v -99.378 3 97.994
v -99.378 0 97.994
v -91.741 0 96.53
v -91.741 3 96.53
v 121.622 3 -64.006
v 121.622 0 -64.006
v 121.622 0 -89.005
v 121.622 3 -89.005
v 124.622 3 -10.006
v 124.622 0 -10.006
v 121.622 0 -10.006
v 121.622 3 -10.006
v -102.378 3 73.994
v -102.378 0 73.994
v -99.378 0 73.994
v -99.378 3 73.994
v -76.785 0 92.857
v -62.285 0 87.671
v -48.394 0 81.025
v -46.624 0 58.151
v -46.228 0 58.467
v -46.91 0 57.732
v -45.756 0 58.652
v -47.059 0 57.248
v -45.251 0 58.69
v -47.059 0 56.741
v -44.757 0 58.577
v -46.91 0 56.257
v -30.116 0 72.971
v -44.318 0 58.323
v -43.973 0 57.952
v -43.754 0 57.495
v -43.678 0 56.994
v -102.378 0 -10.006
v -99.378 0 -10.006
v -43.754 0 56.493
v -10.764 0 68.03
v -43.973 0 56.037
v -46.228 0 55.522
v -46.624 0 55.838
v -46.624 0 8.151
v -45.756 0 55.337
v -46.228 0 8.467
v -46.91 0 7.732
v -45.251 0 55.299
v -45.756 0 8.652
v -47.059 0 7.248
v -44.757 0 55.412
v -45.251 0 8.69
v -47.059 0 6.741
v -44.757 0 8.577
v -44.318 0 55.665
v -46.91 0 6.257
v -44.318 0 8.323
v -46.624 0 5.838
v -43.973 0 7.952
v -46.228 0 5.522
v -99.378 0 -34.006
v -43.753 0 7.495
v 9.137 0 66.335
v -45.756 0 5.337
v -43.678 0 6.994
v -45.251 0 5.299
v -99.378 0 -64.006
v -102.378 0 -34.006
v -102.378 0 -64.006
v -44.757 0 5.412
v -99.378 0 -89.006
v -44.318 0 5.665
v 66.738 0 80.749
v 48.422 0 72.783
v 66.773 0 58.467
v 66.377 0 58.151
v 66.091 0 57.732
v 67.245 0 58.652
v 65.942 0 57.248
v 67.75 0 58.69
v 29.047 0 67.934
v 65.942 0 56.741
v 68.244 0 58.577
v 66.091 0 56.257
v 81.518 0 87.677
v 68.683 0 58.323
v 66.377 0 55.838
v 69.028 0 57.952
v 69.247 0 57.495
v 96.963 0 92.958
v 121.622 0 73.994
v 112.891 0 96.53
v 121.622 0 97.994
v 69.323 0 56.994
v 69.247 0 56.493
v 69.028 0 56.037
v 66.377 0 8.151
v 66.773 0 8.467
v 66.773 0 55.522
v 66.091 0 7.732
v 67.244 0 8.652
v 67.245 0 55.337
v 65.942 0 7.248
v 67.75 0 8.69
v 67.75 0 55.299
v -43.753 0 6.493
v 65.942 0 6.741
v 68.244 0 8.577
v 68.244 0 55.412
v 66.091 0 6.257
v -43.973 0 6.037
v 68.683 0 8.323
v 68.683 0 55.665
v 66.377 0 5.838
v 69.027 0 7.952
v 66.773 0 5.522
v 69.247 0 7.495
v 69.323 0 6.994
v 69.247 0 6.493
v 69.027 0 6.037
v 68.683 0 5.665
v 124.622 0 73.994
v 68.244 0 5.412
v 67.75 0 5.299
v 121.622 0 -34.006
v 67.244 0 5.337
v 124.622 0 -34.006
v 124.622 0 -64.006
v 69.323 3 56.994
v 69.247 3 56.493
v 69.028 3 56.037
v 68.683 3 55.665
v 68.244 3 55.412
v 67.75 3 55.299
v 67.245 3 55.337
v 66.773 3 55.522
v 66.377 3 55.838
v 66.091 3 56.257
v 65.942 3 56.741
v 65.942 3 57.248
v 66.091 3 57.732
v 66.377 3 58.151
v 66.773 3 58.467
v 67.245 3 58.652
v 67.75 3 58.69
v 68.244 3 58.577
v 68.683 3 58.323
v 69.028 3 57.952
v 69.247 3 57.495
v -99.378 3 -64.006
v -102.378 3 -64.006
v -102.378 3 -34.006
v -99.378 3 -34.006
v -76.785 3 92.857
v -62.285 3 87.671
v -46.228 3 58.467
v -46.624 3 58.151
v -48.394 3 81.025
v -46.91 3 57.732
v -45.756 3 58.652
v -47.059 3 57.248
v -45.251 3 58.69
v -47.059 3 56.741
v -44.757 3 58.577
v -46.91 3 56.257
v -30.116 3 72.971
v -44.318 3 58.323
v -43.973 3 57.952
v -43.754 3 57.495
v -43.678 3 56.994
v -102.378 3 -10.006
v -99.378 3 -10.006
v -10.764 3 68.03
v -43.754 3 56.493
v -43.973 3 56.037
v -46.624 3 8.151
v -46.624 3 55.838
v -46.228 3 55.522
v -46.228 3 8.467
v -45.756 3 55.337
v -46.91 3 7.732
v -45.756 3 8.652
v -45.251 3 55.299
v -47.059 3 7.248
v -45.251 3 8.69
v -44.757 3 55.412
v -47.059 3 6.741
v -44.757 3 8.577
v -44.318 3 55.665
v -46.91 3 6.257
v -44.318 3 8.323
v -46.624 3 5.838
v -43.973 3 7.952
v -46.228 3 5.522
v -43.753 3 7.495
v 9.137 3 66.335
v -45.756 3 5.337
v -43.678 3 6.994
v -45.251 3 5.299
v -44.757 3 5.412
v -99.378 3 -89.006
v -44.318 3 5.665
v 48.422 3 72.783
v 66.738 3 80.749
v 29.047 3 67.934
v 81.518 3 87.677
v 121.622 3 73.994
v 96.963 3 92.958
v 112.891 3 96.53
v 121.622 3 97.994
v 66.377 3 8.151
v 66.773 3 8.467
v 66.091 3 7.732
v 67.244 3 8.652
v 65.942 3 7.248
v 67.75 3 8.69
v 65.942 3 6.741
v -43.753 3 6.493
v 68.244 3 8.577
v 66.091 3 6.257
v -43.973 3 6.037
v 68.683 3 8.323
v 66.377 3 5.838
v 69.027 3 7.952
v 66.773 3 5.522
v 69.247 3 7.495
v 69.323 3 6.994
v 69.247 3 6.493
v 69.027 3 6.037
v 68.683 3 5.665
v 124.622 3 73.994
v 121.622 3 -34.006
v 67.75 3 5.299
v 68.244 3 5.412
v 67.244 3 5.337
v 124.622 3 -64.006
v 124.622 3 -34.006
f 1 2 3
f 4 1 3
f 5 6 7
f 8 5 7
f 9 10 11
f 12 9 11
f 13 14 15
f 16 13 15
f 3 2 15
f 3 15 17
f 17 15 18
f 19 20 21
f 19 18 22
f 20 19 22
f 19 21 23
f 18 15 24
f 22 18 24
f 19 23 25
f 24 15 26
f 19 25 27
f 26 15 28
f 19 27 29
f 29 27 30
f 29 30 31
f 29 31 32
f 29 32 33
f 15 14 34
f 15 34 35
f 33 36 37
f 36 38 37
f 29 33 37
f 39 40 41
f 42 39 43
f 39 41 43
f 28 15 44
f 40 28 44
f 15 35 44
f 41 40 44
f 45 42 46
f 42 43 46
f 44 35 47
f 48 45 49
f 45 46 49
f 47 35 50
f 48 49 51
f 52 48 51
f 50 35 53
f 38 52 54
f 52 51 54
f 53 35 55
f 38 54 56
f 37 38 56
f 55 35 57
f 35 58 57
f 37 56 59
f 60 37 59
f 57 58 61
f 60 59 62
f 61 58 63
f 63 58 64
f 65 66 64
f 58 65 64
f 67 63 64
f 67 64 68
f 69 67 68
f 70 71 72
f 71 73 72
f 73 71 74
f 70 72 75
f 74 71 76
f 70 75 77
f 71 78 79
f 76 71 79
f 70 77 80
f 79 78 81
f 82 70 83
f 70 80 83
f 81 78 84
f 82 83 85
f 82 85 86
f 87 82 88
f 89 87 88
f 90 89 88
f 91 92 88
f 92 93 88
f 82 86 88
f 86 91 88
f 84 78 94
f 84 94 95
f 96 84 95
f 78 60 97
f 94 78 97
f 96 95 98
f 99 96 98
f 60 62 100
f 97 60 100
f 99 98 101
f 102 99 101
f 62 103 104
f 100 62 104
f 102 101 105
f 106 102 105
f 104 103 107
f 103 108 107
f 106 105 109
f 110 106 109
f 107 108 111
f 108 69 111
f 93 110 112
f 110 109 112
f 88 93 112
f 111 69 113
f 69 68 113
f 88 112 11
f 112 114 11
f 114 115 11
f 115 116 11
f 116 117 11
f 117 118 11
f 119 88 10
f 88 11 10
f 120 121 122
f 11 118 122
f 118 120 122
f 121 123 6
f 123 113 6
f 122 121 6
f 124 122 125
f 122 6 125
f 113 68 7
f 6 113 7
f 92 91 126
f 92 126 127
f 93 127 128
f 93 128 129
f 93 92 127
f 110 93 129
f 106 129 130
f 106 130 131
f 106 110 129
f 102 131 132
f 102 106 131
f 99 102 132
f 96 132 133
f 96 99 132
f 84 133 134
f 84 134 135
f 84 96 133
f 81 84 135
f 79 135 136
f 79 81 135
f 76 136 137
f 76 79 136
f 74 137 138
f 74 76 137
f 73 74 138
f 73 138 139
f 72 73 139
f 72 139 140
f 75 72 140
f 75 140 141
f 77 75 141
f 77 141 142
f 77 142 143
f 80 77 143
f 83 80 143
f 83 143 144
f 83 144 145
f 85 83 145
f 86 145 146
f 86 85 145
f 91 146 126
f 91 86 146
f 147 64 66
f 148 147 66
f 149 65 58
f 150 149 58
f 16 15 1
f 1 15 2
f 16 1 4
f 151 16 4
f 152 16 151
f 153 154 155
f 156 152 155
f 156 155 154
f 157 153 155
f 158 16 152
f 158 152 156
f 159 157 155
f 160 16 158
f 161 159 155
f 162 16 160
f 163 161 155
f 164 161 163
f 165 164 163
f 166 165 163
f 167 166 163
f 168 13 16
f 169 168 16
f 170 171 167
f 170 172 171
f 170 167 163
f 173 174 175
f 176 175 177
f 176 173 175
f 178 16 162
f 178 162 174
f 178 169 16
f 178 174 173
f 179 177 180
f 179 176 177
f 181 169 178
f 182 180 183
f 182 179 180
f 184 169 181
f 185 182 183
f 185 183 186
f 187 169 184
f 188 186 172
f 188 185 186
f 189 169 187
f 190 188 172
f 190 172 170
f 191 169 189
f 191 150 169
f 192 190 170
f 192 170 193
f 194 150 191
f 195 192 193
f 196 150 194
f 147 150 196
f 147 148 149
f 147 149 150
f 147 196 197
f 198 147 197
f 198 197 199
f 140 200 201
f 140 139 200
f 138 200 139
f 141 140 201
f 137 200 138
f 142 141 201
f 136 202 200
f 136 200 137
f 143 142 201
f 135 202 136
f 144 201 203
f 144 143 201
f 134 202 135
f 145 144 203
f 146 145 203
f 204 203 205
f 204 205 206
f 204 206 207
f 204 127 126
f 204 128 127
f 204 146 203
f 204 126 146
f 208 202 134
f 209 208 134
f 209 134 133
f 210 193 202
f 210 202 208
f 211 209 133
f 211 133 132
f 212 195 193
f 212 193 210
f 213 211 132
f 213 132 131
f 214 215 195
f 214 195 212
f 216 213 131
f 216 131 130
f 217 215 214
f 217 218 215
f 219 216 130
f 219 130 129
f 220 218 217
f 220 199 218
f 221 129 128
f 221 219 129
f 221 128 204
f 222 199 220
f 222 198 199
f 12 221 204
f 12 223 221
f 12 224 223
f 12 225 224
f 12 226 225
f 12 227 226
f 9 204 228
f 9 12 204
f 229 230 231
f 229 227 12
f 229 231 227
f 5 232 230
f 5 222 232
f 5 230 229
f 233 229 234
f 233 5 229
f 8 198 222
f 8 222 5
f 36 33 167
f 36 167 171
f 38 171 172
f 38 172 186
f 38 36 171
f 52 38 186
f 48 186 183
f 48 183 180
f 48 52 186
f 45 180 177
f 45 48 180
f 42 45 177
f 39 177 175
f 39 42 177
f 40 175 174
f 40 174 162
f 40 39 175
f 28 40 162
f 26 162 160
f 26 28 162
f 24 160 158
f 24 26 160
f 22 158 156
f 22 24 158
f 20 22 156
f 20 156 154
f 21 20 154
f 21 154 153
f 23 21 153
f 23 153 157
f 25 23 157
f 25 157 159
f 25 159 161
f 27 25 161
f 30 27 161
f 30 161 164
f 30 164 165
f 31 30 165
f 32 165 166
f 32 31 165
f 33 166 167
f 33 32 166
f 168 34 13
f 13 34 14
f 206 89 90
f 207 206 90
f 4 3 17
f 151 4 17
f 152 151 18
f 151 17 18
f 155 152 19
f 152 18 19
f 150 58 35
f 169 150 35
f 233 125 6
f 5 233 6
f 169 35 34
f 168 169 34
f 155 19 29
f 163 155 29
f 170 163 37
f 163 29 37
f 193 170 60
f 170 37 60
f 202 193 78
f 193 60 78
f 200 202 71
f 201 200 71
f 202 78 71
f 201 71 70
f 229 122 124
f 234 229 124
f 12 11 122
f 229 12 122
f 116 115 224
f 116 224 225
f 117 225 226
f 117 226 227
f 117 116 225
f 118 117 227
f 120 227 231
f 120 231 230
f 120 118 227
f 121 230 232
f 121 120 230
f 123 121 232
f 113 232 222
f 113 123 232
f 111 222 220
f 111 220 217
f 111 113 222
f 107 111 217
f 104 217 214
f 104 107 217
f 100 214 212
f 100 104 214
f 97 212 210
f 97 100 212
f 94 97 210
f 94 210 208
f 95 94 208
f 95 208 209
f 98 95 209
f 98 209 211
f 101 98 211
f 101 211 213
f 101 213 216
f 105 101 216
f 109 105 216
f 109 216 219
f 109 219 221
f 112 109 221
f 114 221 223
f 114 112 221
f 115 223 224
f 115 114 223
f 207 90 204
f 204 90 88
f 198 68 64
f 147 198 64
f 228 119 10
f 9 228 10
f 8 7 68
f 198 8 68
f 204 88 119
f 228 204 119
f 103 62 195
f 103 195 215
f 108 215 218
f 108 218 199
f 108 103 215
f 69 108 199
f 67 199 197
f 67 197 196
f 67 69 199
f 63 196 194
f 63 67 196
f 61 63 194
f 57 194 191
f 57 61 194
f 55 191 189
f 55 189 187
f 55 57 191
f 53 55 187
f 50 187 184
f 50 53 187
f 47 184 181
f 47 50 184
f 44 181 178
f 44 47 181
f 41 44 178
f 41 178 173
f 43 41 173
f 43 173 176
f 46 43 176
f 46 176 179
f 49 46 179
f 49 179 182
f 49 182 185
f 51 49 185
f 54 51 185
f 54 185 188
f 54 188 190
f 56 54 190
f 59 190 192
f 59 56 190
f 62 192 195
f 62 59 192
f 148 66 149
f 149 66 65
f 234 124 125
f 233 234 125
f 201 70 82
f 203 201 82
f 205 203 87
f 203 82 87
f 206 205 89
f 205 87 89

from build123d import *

# Parameters (mm, degrees)
CROQUIS1_R              = 1.7
SALIENTE_EXTRUIR1_DEPTH = 3


with BuildPart() as part:
    # Croquis1 → Saliente-Extruir1 (new body)
    with BuildSketch(Plane(origin=(0, 0, 0), x_dir=(1, 0, 0), z_dir=(0, 1, 0))):
        with BuildLine():
            Line((-99.377556398, 10.005876847), (-102.377556398, 10.005876847))
            Line((-102.377556398, 10.005876847), (-102.377556398, -73.994123153))
            Line((-102.377556398, -73.994123153), (-99.377556398, -73.994123153))
            Line((-99.377556398, -73.994123153), (-99.377556398, -97.994123153))
            Line((-99.377556398, -97.994123153), (-91.7405656, -96.529736825))
            ThreePointArc((-91.7405656, -96.529736825), (-69.468775837, -90.450126114), (-48.393725101, -81.024813273))
            ThreePointArc((-48.393725101, -81.024813273), (9.137426833, -66.335488141), (66.738359446, -80.748755569))
            ThreePointArc((66.738359446, -80.748755569), (89.168735578, -90.527731735), (112.890583803, -96.529736825))
            Line((112.890583803, -96.529736825), (121.622443602, -97.994123153))
            Line((121.622443602, -97.994123153), (121.622443602, -73.994123153))
            Line((121.622443602, -73.994123153), (124.622443602, -73.994123153))
            Line((124.622443602, -73.994123153), (124.622443602, 10.005876847))
            Line((124.622443602, 10.005876847), (121.622443602, 10.005876847))
            Line((121.622443602, 10.005876847), (121.622443602, 34.005876847))
            Line((121.622443602, 34.005876847), (124.622443602, 34.005876847))
            Line((124.622443602, 34.005876847), (124.622443602, 64.005876847))
            Line((124.622443602, 64.005876847), (121.622443602, 64.005876847))
            Line((121.622443602, 64.005876847), (121.622443602, 89.005112069))
            Line((121.622443602, 89.005112069), (-99.377556398, 89.005839795))
            Line((-99.377556398, 89.005839795), (-99.377556398, 64.005876847))
            Line((-99.377556398, 64.005876847), (-102.377556398, 64.005876847))
            Line((-102.377556398, 64.005876847), (-102.377556398, 34.005876847))
            Line((-102.377556398, 34.005876847), (-99.377556398, 34.005876847))
            Line((-99.377556398, 34.005876847), (-99.377556398, 10.005876847))
        make_face()
        with Locations((-45.378037158, -56.994306397)):
            Circle(CROQUIS1_R, mode=Mode.SUBTRACT)
        with Locations((-45.377872514, -6.994306397)):
            Circle(CROQUIS1_R, mode=Mode.SUBTRACT)
        with Locations((67.622759718, -6.994306397)):
            Circle(CROQUIS1_R, mode=Mode.SUBTRACT)
        with Locations((67.622924362, -56.994306397)):
            Circle(CROQUIS1_R, mode=Mode.SUBTRACT)
    extrude(amount=SALIENTE_EXTRUIR1_DEPTH)


solid = part.part
